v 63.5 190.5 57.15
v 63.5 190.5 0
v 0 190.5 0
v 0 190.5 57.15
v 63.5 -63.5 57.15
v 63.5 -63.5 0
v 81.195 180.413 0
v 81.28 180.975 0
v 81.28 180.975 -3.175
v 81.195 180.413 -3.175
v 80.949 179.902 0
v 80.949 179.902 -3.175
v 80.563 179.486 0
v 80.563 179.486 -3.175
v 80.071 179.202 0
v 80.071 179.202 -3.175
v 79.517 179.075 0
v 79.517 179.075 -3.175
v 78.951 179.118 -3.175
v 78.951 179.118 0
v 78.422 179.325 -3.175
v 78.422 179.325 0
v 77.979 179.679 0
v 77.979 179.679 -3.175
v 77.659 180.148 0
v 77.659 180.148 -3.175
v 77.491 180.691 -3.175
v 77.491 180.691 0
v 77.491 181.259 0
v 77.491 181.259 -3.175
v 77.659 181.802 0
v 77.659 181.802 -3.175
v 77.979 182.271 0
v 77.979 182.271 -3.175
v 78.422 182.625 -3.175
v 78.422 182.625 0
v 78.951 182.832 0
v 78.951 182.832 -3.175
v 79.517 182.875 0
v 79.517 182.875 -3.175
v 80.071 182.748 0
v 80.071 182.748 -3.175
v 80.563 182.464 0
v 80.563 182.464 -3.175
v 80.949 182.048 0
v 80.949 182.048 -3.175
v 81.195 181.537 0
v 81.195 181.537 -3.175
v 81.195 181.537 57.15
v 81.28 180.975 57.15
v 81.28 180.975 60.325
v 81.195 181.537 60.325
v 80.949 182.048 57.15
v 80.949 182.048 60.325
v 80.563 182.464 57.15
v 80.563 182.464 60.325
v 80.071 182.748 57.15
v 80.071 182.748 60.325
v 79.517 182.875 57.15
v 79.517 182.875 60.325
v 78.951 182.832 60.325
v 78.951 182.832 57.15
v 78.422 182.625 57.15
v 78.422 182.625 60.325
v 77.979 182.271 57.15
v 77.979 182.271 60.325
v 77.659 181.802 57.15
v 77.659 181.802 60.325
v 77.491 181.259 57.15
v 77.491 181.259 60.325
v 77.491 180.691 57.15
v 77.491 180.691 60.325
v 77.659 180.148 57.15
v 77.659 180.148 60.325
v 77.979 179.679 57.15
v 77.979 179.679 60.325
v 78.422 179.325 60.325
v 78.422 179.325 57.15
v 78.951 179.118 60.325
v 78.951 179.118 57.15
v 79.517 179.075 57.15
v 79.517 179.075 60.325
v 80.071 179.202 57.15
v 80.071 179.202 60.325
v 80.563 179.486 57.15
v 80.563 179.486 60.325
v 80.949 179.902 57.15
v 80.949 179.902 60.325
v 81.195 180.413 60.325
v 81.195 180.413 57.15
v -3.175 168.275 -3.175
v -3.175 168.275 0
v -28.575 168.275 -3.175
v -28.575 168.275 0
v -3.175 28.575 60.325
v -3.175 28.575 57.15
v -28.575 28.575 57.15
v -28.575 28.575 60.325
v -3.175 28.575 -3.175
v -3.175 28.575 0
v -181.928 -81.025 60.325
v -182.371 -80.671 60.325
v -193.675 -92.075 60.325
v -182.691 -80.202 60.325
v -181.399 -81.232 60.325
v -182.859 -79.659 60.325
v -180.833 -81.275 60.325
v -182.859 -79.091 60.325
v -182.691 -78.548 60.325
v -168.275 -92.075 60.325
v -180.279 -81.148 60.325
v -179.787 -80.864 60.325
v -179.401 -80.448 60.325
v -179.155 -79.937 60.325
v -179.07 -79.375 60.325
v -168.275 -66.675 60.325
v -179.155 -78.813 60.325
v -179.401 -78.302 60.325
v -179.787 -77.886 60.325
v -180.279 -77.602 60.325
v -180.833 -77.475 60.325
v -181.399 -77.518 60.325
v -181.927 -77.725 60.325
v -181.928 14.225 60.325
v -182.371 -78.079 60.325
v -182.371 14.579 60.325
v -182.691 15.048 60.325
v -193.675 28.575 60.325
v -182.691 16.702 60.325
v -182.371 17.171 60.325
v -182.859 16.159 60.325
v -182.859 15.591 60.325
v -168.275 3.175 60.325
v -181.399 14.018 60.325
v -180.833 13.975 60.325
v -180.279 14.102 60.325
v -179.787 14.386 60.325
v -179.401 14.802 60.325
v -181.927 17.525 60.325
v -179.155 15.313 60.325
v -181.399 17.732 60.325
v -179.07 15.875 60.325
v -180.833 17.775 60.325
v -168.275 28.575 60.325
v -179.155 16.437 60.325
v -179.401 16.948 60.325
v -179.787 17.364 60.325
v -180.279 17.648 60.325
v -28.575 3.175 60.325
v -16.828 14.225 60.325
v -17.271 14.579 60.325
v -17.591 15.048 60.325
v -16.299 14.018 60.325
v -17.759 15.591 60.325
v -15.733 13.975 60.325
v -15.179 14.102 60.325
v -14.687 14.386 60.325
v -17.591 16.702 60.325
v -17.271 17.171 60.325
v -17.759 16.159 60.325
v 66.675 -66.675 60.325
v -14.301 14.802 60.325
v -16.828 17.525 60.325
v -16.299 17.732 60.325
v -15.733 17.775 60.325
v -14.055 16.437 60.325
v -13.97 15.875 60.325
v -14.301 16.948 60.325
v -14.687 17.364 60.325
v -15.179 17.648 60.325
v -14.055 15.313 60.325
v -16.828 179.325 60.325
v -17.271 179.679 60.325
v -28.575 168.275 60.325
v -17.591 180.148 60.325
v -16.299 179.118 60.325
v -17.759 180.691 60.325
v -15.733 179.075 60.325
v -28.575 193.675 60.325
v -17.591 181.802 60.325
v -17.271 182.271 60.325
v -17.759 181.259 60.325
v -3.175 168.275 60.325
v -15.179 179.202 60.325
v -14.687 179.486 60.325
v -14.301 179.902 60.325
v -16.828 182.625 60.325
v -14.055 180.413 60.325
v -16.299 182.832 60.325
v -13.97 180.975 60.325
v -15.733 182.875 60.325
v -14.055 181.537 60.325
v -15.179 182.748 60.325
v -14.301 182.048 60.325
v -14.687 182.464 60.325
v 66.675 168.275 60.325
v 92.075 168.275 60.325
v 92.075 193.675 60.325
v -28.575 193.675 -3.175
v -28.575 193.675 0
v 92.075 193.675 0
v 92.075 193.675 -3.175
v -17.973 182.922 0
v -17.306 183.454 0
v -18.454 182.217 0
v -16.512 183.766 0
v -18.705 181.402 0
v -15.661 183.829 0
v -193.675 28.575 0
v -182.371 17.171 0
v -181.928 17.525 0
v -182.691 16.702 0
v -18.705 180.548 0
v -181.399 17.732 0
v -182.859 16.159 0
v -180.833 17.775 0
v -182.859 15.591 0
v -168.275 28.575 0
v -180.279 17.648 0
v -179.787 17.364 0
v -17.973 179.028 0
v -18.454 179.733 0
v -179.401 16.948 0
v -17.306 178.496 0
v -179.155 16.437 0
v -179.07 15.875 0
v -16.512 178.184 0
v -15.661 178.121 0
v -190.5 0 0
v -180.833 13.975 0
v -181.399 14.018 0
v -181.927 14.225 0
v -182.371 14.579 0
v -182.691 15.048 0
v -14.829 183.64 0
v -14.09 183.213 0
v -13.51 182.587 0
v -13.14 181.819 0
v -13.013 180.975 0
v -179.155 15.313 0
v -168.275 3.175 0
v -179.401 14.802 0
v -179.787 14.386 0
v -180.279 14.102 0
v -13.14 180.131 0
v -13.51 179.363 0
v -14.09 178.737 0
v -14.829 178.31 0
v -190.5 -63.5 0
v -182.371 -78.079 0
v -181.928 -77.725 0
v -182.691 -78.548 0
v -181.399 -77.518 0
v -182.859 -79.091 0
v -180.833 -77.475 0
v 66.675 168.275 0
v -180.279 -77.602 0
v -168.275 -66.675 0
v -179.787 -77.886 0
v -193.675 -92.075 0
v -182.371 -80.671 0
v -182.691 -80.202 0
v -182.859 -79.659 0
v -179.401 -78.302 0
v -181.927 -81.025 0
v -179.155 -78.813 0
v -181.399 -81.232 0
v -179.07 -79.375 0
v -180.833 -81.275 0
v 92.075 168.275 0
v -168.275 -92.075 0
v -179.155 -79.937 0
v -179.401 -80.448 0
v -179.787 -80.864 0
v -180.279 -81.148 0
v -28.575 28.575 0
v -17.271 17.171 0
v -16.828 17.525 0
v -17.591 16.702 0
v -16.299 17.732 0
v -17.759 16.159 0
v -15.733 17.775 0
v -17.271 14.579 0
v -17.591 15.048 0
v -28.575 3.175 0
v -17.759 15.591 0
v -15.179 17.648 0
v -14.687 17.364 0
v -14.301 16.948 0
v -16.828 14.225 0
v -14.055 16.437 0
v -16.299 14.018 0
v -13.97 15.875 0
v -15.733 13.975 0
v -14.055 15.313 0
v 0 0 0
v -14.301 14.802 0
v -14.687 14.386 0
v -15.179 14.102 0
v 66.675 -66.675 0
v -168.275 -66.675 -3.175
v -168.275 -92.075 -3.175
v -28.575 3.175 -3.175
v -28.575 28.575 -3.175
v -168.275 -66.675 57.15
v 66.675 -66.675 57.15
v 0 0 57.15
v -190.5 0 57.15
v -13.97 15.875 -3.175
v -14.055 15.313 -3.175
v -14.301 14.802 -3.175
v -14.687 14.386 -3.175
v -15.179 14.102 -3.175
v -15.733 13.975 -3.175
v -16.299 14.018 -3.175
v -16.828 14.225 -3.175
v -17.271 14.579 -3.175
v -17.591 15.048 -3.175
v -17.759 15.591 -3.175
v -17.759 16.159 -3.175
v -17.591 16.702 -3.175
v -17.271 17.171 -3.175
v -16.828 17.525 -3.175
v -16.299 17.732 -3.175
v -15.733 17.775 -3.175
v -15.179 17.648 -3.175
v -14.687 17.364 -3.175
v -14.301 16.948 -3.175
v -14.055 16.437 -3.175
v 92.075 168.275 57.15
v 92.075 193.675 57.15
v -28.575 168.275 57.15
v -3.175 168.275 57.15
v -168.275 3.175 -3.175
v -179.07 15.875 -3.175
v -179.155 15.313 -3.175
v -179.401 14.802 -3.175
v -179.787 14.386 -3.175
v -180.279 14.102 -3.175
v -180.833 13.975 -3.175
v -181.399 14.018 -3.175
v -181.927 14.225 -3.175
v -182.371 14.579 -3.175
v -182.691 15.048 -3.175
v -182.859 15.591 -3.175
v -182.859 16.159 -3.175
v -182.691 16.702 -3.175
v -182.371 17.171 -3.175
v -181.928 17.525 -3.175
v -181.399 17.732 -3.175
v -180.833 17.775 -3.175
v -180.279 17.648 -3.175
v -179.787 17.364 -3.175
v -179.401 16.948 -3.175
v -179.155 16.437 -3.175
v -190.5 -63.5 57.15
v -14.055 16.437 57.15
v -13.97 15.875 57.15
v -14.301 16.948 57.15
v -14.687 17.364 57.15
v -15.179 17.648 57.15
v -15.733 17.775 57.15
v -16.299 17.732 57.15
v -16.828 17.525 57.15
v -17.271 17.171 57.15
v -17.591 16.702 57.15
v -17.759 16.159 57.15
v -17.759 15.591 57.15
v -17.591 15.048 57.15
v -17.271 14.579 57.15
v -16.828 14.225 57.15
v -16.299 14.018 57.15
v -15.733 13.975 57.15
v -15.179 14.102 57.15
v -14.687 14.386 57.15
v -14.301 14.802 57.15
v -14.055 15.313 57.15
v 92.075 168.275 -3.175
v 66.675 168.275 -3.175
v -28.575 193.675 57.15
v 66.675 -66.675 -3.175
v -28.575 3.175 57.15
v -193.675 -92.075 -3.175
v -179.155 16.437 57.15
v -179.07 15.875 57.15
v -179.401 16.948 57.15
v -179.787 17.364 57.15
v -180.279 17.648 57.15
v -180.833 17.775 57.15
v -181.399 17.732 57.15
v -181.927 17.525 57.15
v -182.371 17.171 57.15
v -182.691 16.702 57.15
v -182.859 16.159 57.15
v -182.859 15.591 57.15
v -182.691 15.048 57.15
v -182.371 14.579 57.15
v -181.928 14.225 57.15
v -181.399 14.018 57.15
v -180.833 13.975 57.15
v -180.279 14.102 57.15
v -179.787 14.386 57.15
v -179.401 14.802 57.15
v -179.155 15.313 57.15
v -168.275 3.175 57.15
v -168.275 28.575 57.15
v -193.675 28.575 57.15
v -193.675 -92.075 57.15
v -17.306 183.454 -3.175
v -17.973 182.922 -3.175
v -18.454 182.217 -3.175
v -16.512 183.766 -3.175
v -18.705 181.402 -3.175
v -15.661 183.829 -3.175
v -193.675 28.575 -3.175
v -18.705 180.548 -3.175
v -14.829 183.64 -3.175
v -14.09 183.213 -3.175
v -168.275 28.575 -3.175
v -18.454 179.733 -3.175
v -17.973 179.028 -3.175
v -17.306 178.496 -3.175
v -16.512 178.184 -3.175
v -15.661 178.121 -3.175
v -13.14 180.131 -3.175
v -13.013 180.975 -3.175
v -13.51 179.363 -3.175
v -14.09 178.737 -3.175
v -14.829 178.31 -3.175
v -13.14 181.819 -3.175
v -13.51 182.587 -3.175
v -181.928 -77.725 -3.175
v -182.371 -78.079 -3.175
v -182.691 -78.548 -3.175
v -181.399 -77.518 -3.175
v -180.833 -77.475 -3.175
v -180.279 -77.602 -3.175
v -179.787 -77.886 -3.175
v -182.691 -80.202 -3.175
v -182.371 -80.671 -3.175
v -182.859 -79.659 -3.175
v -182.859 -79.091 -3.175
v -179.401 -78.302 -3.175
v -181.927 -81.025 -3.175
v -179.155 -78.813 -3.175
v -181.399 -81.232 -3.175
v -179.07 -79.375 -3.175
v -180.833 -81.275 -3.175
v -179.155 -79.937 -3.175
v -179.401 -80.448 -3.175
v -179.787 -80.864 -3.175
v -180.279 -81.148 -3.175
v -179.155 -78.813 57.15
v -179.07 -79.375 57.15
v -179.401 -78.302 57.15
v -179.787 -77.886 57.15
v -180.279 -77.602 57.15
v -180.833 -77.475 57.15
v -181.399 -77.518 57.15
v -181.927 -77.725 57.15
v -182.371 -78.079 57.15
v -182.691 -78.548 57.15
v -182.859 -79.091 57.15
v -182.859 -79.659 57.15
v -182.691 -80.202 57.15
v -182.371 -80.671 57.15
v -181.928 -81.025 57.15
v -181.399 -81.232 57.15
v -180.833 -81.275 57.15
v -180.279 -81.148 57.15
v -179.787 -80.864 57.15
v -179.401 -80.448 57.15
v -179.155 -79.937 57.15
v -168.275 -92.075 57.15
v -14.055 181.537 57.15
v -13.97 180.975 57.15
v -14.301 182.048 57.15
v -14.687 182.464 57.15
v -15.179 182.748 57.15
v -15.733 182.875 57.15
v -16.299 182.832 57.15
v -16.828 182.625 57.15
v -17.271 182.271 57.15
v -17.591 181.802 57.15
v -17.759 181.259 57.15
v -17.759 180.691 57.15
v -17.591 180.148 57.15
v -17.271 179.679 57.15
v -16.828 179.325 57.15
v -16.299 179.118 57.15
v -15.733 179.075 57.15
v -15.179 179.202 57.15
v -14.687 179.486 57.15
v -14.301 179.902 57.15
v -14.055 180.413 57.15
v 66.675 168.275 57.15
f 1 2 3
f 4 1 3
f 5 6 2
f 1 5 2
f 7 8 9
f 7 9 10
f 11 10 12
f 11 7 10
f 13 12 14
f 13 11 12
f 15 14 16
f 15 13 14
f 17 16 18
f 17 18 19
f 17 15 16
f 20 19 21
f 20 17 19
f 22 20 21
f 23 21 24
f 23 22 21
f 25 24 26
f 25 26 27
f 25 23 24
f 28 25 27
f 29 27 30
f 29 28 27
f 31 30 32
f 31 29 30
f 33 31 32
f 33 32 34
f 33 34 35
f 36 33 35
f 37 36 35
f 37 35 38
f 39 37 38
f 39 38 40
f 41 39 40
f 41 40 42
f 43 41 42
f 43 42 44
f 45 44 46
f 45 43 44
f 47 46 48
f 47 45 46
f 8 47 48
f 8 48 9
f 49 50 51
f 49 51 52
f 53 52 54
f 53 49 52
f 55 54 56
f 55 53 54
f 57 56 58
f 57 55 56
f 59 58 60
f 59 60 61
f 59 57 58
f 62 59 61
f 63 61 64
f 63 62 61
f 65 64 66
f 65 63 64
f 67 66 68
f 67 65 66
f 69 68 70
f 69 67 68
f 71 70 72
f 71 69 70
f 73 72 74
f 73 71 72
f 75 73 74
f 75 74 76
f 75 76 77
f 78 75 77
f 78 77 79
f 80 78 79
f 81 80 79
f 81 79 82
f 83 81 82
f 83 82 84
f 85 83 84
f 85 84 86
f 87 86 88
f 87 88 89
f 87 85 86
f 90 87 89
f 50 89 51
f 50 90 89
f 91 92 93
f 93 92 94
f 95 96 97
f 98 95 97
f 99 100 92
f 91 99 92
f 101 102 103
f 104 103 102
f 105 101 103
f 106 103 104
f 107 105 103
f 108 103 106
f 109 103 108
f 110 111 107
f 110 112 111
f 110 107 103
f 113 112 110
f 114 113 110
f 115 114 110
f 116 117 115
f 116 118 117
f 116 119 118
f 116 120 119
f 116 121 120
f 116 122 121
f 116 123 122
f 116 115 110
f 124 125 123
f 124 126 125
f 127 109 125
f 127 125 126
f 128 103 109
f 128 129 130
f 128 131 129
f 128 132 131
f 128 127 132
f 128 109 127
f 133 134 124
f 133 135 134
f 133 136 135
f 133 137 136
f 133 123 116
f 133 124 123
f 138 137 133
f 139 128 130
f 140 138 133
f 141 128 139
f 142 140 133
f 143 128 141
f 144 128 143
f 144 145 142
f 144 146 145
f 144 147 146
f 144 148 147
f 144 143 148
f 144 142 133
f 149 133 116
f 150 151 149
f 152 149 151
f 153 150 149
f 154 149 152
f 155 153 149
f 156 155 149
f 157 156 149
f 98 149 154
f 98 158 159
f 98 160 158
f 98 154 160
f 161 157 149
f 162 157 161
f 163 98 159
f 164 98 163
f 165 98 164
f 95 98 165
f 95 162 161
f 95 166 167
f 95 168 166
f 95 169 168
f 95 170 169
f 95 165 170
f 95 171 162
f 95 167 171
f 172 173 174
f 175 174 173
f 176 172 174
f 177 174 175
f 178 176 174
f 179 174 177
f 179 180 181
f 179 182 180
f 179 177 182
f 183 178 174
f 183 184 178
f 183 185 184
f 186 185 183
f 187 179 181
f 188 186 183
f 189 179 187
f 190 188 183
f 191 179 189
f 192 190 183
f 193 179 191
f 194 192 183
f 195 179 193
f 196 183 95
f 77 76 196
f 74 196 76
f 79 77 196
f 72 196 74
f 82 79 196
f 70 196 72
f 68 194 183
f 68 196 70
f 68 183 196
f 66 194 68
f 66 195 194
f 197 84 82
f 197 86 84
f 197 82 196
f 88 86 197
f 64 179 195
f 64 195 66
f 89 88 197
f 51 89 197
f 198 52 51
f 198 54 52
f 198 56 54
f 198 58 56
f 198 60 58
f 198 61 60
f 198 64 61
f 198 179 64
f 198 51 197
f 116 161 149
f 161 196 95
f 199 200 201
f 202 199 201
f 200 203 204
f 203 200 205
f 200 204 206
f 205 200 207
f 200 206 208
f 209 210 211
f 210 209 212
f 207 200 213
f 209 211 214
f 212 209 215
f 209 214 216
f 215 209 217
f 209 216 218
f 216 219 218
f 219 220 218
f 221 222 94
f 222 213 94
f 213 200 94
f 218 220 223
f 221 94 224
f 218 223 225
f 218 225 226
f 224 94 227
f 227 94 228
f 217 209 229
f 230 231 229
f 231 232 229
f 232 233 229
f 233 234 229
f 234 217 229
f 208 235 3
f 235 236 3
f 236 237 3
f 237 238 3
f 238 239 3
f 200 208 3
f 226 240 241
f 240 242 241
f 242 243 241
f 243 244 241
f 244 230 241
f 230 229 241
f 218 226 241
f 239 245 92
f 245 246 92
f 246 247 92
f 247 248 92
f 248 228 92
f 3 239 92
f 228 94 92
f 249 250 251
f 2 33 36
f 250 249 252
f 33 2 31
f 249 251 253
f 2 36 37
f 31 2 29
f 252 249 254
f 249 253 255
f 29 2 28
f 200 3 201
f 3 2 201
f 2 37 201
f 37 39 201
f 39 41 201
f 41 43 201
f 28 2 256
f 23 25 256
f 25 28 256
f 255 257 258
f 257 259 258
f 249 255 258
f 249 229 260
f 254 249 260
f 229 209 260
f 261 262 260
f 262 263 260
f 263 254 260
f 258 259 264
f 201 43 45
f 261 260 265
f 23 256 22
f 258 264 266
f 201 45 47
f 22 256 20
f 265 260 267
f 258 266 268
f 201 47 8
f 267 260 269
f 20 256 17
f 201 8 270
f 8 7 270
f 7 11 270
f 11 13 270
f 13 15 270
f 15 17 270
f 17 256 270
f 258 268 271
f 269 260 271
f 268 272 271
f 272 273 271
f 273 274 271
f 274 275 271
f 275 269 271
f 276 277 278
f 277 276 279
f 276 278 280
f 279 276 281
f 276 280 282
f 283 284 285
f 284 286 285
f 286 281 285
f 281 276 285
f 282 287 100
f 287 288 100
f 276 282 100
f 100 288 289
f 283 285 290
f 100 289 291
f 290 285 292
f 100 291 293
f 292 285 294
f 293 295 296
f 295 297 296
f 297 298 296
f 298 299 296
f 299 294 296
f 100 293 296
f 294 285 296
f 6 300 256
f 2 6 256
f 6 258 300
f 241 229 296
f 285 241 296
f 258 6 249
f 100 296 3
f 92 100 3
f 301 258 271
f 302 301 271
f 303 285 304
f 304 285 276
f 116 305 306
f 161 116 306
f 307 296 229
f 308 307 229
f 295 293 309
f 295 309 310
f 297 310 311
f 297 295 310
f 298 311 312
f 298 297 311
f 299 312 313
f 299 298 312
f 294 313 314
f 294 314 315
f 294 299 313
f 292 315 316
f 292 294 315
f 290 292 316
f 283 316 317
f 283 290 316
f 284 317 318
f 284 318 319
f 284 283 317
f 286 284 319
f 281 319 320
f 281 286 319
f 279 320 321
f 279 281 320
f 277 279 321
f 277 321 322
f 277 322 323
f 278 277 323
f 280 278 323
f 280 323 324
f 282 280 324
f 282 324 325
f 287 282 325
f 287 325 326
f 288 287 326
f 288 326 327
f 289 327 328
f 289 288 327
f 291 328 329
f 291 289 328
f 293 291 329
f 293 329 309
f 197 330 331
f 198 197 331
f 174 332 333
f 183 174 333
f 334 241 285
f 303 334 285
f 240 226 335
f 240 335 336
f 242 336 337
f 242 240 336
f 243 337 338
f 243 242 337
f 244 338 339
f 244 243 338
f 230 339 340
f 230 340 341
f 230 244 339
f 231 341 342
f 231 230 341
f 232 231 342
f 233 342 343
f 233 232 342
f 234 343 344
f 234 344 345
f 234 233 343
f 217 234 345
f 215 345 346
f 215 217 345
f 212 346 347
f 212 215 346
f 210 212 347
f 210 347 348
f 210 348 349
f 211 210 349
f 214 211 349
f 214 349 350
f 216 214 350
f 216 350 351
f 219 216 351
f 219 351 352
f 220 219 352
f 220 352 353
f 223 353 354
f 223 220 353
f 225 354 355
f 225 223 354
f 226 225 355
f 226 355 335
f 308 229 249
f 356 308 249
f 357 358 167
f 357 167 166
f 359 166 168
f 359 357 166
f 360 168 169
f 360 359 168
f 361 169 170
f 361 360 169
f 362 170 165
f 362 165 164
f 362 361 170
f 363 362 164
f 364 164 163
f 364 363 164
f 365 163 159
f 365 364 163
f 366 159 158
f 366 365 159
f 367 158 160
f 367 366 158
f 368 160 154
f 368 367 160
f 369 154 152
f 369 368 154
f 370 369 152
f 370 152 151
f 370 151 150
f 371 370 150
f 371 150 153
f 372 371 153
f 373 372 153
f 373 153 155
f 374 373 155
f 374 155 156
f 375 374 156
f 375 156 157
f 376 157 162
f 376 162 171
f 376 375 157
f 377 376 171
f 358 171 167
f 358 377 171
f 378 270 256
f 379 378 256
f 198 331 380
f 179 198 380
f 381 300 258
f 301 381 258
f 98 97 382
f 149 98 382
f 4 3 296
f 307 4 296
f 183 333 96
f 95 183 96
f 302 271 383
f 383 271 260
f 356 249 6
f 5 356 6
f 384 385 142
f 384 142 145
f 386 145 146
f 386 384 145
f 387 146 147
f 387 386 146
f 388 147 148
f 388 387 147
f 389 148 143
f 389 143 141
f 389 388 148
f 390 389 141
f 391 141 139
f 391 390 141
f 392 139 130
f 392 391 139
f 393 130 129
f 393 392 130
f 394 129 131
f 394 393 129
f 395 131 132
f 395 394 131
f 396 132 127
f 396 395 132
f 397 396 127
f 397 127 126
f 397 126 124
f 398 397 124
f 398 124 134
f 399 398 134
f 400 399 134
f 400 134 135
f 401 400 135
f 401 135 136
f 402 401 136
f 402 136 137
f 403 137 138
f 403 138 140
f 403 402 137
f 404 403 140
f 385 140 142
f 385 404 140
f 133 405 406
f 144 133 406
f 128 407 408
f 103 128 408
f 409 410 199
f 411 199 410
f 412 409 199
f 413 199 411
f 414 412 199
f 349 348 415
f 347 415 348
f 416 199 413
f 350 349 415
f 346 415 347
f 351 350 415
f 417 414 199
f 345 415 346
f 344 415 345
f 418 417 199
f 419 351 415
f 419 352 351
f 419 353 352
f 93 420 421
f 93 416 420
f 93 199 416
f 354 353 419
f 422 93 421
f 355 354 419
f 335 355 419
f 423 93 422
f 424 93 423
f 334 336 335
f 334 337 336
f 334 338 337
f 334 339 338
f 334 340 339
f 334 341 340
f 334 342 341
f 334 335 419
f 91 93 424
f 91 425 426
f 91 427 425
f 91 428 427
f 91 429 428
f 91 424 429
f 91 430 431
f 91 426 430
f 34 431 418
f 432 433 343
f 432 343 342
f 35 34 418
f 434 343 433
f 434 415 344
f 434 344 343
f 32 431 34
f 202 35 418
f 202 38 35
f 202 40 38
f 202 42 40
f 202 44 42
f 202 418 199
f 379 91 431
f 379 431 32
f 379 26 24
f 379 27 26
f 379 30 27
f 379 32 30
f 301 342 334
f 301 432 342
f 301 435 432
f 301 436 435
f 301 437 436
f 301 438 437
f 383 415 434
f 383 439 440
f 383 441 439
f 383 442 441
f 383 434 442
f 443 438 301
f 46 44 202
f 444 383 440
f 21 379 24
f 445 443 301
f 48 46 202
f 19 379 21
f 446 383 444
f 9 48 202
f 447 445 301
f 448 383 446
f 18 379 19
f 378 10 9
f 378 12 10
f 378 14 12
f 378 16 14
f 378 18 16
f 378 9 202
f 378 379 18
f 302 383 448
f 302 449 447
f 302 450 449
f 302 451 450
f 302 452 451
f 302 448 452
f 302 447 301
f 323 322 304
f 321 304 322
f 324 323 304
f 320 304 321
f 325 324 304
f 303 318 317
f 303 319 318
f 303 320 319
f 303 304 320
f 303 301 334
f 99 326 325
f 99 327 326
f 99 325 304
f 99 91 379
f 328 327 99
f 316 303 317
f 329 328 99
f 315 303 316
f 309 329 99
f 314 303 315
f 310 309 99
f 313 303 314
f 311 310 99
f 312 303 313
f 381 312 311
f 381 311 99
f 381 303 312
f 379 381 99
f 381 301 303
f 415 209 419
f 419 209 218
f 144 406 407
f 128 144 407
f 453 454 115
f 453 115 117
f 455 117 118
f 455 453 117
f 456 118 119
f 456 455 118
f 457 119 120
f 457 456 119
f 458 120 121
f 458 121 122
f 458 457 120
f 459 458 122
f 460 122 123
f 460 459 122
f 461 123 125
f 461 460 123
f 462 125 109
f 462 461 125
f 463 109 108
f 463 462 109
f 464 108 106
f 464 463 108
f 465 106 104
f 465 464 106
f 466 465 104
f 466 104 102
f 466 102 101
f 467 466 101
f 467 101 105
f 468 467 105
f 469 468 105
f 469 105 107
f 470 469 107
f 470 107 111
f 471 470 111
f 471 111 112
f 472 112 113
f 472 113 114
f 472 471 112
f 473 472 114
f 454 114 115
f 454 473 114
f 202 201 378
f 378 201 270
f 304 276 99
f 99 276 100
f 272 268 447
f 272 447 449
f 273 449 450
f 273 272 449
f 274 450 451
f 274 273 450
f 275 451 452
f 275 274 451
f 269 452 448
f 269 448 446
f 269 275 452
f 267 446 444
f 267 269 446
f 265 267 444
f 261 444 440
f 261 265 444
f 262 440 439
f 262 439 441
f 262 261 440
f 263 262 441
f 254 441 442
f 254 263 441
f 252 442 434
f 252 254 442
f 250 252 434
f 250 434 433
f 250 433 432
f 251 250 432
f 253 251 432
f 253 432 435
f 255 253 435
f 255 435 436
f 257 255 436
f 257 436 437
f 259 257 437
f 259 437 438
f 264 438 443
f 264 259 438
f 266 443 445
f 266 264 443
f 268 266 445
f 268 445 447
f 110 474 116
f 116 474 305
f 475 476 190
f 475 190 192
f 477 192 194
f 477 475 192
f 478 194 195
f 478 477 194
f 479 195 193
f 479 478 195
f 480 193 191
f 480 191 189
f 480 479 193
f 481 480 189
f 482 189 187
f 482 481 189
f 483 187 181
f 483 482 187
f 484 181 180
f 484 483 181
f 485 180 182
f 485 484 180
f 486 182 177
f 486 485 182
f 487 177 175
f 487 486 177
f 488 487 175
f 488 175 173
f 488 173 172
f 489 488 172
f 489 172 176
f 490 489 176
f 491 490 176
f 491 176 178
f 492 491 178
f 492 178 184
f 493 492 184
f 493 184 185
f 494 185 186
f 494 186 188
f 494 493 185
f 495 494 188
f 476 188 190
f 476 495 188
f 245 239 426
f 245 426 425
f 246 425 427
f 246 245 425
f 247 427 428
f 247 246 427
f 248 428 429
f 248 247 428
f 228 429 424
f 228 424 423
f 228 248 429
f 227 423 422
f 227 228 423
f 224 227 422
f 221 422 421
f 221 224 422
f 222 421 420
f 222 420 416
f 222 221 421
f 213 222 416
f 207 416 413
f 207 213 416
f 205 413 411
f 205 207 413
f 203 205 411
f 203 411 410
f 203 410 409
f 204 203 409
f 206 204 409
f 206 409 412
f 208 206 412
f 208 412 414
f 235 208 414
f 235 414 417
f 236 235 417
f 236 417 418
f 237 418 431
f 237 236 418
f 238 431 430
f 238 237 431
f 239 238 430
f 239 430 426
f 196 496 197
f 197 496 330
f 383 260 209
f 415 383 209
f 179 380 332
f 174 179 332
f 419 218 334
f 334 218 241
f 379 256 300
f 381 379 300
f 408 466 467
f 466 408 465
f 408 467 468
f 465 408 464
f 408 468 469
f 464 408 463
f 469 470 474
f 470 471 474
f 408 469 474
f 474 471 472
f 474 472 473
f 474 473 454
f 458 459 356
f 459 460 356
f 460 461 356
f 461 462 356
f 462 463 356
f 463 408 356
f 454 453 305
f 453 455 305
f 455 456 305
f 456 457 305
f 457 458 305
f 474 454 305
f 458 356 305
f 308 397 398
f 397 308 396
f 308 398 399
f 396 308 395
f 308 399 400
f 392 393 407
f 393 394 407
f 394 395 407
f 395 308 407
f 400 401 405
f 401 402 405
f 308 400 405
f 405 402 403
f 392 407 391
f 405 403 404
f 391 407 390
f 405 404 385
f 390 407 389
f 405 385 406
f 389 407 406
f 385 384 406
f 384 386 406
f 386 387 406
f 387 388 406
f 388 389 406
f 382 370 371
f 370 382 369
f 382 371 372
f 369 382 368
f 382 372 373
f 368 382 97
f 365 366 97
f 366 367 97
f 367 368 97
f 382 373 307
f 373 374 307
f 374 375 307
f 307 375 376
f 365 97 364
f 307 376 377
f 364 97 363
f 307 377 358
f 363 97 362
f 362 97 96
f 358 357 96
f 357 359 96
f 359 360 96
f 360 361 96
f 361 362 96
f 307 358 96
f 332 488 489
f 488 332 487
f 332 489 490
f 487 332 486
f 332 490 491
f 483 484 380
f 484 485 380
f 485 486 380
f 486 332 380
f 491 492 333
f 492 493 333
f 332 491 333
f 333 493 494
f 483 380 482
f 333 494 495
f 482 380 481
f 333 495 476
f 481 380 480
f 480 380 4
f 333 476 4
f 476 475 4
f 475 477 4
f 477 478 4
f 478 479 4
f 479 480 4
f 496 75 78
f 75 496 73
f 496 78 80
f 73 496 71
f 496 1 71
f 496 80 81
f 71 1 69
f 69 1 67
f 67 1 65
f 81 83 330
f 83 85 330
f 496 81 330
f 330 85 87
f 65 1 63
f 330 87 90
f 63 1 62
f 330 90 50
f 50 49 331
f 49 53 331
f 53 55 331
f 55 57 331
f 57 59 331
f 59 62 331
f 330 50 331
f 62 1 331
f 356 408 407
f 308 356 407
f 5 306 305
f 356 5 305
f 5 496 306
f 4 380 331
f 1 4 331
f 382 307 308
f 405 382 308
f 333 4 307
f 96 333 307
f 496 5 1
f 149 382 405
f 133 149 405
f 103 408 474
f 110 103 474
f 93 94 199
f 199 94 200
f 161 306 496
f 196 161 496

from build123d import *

# Parameters (mm, degrees)
F1_DEPTH = 57.15
F2_R     = 2.8624183912
F2_R_2   = 1.905
F3_DEPTH = 3.175
F4_R     = 1.905
F5_DEPTH = 3.175


with BuildPart() as f1:
    # F0 (on Top) → F1 (new body)
    with BuildSketch(Plane.XY):
        Polygon((-190.5, 0), (-190.5, -63.5), (63.5, -63.5), (63.5, 190.5), (0, 190.5), (0, 0), align=None)
    extrude(amount=F1_DEPTH)

    # F2 (on face) → F3 (join)
    with BuildSketch(Plane(origin=(0, 0, 0), x_dir=(1, 0, 0), z_dir=(0, 0, -1))):
        Polygon((-168.275, -3.175), (-28.575, -3.175), (-28.575, -28.575), (-3.175, -28.575), (-3.175, -168.275), (-28.575, -168.275), (-28.575, -193.675), (-3.175, -193.675), (66.675, -193.675), (92.075, -193.675), (92.075, -168.275), (66.675, -168.275), (66.675, 66.675), (-168.275, 66.675), (-168.275, 92.075), (-193.675, 92.075), (-193.675, 66.675), (-193.675, -3.175), (-193.675, -28.575), (-168.275, -28.575), align=None)
        Polygon((-190.5, 0), (-190.5, 63.5), (63.5, 63.5), (63.5, -190.5), (0, -190.5), (0, 0), align=None, mode=Mode.SUBTRACT)
        with Locations((-15.875, -180.975)):
            Circle(F2_R, mode=Mode.SUBTRACT)
        with Locations((79.375, -180.975)):
            Circle(F2_R_2, mode=Mode.SUBTRACT)
        with Locations((-180.975, -15.875)):
            Circle(F2_R_2, mode=Mode.SUBTRACT)
        with Locations((-180.975, 79.375)):
            Circle(F2_R_2, mode=Mode.SUBTRACT)
        with Locations((-15.875, -15.875)):
            Circle(F2_R_2, mode=Mode.SUBTRACT)
        Polygon((63.5, 63.5), (-190.5, 63.5), (-190.5, 0), (0, 0), (0, -190.5), (63.5, -190.5), align=None)
    extrude(amount=F3_DEPTH)

    # F4 (on face) → F5 (join)
    with BuildSketch(Plane.XY.offset(57.15)):
        Polygon((-28.575, 168.275), (-3.175, 168.275), (-3.175, 28.575), (-28.575, 28.575), (-28.575, 3.175), (-168.275, 3.175), (-168.275, 28.575), (-193.675, 28.575), (-193.675, 3.175), (-193.675, -66.675), (-193.675, -92.075), (-168.275, -92.075), (-168.275, -66.675), (66.675, -66.675), (66.675, 168.275), (92.075, 168.275), (92.075, 193.675), (66.675, 193.675), (-3.175, 193.675), (-28.575, 193.675), align=None)
        with Locations((-180.975, -79.375)):
            Circle(F4_R, mode=Mode.SUBTRACT)
        with Locations((-180.975, 15.875)):
            Circle(F4_R, mode=Mode.SUBTRACT)
        with Locations((-15.875, 15.875)):
            Circle(F4_R, mode=Mode.SUBTRACT)
        with Locations((-15.875, 180.975)):
            Circle(F4_R, mode=Mode.SUBTRACT)
        with Locations((79.375, 180.975)):
            Circle(F4_R, mode=Mode.SUBTRACT)
    extrude(amount=F5_DEPTH)


solid = f1.part
